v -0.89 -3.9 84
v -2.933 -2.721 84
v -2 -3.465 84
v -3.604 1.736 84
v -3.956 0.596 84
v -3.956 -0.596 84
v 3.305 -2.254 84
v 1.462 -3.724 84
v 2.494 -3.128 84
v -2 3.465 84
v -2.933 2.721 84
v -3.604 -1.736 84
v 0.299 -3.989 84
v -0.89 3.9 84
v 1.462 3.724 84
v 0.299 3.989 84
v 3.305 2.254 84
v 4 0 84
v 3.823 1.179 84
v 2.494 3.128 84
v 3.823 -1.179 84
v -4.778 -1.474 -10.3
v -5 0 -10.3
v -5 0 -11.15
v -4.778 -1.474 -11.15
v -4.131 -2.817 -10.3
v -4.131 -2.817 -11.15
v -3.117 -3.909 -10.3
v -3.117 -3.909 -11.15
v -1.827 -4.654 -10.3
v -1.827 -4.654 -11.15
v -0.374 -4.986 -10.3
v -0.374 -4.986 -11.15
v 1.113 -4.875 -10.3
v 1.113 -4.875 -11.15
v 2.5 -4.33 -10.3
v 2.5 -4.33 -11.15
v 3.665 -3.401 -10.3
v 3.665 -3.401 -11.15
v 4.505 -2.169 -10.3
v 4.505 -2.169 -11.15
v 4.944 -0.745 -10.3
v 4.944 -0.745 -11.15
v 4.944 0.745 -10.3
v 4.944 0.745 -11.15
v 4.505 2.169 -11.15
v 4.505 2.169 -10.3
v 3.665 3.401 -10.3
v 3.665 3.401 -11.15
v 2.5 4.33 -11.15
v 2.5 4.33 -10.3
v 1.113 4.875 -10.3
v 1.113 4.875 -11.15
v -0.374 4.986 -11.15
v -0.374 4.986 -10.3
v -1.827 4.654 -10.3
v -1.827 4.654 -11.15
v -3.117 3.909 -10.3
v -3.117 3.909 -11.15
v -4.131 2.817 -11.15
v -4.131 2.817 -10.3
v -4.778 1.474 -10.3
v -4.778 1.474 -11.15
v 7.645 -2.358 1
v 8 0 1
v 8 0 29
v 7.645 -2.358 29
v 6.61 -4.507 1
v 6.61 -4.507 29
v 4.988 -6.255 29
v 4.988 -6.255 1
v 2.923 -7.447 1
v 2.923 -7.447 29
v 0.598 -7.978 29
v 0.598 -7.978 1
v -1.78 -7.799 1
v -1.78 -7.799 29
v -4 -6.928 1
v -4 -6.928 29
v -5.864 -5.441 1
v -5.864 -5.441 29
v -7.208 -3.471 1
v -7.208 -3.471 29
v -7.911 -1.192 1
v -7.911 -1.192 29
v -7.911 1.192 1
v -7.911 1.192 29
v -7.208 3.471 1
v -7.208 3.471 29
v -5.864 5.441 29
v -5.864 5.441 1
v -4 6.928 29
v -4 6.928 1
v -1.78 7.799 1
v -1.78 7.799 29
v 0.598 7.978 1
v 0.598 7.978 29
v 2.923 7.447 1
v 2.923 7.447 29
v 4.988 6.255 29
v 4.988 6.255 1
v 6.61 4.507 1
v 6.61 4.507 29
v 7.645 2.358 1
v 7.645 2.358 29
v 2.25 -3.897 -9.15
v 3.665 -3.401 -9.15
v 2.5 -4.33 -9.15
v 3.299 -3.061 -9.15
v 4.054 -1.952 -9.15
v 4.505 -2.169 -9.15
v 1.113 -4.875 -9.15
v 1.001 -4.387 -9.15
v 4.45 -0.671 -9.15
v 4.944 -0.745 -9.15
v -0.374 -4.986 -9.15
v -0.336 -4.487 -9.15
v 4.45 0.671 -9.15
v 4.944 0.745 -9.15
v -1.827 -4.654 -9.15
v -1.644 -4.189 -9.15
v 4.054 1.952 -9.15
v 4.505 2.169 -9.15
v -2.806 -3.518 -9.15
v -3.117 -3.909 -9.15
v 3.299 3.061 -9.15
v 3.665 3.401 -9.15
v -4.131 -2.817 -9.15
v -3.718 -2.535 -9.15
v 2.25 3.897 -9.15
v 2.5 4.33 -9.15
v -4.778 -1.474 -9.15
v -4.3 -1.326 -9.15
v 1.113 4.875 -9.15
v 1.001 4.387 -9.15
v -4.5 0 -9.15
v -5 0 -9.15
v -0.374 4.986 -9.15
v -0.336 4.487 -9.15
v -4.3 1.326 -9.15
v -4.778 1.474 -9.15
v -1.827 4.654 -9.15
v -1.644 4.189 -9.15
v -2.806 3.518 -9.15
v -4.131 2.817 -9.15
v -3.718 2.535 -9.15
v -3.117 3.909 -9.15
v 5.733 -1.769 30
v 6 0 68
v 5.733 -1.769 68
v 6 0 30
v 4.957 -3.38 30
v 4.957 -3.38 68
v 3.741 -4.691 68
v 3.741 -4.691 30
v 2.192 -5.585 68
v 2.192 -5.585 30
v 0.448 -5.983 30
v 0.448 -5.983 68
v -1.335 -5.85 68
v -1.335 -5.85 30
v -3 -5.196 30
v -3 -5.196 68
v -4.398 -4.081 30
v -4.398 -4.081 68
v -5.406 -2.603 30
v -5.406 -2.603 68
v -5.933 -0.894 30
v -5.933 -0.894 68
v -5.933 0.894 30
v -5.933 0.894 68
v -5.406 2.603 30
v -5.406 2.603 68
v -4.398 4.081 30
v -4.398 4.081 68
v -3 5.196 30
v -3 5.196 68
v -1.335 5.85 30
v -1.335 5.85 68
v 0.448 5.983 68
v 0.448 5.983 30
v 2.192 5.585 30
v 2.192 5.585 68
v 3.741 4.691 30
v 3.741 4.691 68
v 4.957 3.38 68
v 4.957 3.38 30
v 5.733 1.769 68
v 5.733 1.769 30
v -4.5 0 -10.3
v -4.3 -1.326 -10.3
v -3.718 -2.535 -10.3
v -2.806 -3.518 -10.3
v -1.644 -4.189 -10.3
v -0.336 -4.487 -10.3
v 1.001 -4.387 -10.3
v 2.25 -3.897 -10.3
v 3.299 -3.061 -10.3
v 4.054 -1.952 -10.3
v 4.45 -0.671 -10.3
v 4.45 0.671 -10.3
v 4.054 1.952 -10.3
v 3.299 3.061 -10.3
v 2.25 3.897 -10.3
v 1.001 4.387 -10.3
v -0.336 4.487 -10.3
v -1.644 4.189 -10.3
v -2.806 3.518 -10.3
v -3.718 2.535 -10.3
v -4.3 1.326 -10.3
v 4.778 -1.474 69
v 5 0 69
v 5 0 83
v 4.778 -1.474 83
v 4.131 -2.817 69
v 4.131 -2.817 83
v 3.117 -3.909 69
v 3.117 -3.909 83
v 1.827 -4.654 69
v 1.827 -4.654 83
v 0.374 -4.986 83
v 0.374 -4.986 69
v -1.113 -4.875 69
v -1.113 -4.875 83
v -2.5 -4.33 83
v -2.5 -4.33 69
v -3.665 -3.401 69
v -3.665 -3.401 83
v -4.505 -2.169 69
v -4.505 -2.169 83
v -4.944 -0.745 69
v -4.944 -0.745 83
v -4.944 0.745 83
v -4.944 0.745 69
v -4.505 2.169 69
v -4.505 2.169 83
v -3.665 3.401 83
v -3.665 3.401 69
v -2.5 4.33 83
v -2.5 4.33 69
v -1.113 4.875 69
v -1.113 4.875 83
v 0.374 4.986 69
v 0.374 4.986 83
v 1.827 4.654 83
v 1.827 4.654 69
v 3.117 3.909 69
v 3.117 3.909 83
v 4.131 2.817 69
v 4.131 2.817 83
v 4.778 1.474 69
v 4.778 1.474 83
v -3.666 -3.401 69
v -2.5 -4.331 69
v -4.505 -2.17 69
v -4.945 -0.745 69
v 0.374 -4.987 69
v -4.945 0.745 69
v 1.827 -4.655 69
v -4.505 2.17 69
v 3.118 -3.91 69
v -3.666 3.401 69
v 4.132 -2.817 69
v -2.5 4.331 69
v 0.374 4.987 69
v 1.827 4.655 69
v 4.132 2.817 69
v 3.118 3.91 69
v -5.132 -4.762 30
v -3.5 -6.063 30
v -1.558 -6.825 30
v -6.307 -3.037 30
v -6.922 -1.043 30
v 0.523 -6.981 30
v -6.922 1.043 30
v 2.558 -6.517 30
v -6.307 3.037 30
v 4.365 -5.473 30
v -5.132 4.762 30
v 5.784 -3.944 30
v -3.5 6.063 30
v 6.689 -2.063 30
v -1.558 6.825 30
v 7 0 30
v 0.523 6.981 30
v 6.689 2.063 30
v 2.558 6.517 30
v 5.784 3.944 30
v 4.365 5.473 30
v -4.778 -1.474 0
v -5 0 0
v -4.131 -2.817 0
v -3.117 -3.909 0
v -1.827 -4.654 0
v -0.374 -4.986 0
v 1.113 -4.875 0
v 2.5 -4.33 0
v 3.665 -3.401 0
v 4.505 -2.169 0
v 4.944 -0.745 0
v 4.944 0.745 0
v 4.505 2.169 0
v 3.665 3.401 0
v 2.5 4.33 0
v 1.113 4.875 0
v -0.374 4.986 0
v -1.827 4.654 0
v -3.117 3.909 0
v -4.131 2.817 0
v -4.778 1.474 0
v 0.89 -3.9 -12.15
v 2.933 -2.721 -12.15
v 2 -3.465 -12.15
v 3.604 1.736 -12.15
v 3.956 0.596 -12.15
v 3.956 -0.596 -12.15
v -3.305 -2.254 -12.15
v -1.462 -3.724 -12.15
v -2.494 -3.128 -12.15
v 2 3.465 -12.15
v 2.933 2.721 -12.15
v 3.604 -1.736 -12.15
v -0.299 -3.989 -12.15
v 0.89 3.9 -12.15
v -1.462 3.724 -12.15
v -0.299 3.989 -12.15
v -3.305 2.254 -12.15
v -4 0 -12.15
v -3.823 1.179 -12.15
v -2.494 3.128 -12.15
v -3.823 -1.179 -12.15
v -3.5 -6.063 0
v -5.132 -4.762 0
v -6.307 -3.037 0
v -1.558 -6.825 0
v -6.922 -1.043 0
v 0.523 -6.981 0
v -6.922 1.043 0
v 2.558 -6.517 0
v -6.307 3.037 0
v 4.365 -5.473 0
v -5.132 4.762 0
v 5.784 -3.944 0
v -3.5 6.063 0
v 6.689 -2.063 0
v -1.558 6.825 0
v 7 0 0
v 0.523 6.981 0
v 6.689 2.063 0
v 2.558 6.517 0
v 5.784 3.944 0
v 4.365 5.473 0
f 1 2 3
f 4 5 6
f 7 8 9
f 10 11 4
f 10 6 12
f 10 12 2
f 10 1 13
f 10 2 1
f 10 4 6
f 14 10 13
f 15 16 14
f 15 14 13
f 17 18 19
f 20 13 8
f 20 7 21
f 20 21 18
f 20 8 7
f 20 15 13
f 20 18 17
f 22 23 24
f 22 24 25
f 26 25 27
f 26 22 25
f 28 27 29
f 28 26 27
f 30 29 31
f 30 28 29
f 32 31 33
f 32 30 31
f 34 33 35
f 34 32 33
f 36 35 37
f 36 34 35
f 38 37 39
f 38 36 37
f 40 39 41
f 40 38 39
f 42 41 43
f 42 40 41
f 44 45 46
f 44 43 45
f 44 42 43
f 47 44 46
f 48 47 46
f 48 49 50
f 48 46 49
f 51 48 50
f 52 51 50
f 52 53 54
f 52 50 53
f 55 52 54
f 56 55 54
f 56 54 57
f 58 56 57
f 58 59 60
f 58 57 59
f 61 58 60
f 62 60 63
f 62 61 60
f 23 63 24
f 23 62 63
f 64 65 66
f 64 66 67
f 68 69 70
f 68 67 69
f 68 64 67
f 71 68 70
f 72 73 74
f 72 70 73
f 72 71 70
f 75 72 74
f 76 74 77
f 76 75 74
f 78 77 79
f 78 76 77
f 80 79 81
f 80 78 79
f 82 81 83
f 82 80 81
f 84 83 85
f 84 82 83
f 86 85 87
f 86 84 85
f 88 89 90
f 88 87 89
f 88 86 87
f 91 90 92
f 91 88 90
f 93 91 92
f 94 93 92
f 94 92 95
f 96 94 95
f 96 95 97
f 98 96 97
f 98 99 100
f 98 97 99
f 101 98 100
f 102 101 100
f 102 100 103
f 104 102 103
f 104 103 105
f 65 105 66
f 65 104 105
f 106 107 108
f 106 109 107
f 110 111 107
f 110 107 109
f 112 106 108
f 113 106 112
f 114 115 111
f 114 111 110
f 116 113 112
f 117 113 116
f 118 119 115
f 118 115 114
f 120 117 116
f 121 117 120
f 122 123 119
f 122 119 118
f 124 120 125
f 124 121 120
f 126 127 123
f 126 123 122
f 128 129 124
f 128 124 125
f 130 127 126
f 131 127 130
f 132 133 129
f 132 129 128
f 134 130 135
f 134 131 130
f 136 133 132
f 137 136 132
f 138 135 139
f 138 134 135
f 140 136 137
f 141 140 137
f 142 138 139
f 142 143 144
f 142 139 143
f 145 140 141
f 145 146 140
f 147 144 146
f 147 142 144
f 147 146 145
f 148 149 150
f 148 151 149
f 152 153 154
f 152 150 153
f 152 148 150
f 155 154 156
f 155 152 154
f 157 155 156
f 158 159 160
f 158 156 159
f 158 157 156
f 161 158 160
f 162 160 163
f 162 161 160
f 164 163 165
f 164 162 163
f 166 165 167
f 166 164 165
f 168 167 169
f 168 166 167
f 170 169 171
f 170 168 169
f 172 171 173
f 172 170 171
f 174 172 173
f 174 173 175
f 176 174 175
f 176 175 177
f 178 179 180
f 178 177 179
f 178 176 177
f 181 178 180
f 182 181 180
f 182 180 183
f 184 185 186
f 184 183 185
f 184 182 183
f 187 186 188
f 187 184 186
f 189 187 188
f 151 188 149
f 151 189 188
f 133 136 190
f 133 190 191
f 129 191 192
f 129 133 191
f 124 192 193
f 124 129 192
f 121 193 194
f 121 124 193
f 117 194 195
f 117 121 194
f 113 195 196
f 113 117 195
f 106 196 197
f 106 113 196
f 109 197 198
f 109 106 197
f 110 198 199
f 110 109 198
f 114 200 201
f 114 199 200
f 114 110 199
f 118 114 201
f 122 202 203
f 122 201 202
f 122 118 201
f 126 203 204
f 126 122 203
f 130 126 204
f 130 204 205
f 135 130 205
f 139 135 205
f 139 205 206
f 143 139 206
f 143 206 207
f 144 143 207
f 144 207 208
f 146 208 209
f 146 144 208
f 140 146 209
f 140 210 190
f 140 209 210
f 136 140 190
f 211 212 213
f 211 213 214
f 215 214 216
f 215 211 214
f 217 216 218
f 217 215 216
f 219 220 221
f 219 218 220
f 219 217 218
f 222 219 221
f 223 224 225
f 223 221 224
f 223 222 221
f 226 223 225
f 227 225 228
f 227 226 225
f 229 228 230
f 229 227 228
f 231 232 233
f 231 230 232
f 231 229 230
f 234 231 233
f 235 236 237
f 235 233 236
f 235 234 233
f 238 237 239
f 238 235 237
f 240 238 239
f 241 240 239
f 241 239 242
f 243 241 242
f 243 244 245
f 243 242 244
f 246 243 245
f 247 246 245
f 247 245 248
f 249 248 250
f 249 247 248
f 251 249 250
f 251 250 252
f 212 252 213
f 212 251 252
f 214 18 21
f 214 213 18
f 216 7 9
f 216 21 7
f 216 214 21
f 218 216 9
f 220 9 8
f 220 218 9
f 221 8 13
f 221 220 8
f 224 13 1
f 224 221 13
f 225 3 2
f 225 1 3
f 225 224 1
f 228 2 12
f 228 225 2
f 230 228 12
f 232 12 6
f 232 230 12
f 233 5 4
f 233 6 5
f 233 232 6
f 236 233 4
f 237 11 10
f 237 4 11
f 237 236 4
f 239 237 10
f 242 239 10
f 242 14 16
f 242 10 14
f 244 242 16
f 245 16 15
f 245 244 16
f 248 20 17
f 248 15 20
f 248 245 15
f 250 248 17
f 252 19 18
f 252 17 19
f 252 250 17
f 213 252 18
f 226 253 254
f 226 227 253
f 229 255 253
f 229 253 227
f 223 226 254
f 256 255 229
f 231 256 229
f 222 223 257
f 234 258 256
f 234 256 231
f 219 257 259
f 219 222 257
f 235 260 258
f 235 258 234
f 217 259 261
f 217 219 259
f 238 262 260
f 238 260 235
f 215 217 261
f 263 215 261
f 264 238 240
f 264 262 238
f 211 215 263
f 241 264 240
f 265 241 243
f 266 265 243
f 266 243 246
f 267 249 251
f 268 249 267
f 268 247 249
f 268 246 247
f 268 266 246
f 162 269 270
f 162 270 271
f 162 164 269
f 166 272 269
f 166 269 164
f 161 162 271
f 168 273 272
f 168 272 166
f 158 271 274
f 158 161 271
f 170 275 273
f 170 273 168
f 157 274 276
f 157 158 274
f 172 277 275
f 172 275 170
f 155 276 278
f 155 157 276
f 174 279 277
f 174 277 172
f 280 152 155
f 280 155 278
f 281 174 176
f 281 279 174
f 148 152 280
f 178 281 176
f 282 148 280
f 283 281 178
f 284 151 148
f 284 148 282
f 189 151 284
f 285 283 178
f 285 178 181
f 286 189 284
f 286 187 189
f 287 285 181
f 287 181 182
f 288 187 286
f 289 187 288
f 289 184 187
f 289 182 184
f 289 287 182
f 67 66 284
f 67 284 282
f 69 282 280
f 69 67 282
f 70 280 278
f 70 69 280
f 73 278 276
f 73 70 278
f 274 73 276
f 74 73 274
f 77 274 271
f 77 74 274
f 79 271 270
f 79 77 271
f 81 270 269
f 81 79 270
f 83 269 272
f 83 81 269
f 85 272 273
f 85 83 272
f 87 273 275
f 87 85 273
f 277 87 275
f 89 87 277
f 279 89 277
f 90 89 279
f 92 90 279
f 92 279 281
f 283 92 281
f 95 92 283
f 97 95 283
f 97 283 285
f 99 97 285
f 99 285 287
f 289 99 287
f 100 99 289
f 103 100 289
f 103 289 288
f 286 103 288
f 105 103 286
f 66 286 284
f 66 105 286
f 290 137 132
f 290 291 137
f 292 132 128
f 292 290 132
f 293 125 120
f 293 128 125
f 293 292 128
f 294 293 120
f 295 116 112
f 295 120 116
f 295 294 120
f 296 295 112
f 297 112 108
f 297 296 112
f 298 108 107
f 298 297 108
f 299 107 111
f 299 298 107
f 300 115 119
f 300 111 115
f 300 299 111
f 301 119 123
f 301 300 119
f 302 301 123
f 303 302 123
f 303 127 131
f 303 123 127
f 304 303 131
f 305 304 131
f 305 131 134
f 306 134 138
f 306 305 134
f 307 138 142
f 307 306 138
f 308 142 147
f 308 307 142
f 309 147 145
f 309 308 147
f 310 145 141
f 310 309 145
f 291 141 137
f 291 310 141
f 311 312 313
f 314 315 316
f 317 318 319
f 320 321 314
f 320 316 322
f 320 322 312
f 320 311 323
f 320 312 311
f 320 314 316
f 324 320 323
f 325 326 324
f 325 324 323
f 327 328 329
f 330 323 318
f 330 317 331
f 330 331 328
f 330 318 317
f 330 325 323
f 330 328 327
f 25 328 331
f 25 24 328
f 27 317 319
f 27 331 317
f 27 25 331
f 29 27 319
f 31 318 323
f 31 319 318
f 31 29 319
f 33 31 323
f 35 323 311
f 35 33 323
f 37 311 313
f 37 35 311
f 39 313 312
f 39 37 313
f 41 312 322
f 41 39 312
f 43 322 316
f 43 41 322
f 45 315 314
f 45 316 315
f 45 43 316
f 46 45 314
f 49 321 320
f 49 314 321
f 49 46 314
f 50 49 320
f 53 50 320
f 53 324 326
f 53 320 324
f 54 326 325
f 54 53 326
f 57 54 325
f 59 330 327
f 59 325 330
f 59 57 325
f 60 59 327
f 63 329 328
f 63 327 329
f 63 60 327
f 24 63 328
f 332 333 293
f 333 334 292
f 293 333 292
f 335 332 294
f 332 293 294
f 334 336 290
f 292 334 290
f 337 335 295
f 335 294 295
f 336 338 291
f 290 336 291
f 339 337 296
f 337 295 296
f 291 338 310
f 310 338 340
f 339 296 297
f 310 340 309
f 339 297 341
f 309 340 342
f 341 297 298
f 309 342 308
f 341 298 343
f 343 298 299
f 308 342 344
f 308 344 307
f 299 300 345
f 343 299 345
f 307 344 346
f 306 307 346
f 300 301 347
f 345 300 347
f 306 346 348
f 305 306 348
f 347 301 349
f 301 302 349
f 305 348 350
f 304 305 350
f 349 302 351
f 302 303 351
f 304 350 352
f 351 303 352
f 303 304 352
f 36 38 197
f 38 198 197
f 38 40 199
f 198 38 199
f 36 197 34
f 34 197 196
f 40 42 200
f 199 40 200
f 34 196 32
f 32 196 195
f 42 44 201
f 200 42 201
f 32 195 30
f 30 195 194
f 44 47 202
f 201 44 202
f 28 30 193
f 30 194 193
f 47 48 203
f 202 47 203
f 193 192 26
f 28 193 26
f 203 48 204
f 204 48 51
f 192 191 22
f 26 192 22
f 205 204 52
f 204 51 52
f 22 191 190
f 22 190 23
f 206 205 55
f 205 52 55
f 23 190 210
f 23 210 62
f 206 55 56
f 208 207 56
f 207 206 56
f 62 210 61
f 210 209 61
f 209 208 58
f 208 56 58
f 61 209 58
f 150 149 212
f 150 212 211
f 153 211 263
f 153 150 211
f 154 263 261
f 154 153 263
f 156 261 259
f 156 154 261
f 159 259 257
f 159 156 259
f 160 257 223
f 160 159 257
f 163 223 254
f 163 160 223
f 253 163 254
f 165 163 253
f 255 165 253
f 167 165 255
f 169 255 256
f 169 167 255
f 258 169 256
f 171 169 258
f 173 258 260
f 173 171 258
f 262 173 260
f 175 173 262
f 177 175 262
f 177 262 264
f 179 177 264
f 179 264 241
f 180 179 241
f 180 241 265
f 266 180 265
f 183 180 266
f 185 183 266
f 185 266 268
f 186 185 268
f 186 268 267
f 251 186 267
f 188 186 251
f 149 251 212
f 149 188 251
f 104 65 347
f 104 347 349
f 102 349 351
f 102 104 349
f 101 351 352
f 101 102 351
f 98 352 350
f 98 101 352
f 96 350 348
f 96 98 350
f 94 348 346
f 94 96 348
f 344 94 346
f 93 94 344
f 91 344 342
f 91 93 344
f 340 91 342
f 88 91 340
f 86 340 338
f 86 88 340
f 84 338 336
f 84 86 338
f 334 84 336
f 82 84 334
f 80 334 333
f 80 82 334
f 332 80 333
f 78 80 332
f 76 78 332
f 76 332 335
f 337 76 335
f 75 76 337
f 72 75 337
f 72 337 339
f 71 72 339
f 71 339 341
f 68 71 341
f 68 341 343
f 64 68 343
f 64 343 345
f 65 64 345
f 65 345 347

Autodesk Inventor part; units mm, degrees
ref_plane "YZ Plane" through (0, 0, 0) normal (1, 0, 0) x (0, 1, 0)
ref_plane "XZ Plane" through (0, 0, 0) normal (0, 1, 0) x (-1, 0, 0)
ref_plane "XY Plane" through (0, 0, 0) normal (0, 0, 1) x (1, 0, 0)
sketch "Esboço1" plane through (0, 0, 0) normal (0, 0, 1) x (1, 0, 0)
  circle A0 centre (0, 0) radius 8
  dimension "d0" = 16
extrude "Extrusão1" add sketch "Esboço1" along normal blind 30
sketch "Esboço2" plane through (0, 0, 30) normal (0, 0, 1) x (1, 0, 0)
  circle A0 centre (0, 0) radius 6
  dimension "d3" = 12
extrude "Extrusão2" add sketch "Esboço2" along normal blind 39
sketch "Esboço3" plane through (0, 0, 69) normal (0, 0, 1) x (1, 0, 0)
  circle A0 centre (0, 0) radius 5
  dimension "d6" = 10
extrude "Extrusão3" add sketch "Esboço3" along normal blind 15
sketch "Esboço4" plane through (0, 0, 0) normal (0, 0, -1) x (-1, 0, 0)
  circle A0 centre (0, 0) radius 5
  dimension "d9" = 10
extrude "Extrusão4" add sketch "Esboço4" along normal blind 9.15
sketch "Esboço5" plane through (0, 0, -9.15) normal (0, 0, -1) x (-1, 0, 0)
  circle A0 centre (0, 0) radius 4.5
  dimension "d12" = 9
extrude "Extrusão5" add sketch "Esboço5" along normal blind 1.15
sketch "Esboço6" plane through (0, 0, -10.3) normal (0, 0, -1) x (-1, 0, 0)
  circle A0 centre (0, 0) radius 5
  dimension "d15" = 10
extrude "Extrusão6" add sketch "Esboço6" along normal blind 1.85
thread "Rosca1" size "M12x1.75" class "6g" standard "ANSI Metric M Profile" length 14
chamfer "Chanfro1" distance 1 angle 45 5 edges at (-5, 0, 84) (-6, 0, 69) (-8, 0, 30) (-8, 0, 0) (5, 0, -12.15)
properties part number "SFU16XX"
